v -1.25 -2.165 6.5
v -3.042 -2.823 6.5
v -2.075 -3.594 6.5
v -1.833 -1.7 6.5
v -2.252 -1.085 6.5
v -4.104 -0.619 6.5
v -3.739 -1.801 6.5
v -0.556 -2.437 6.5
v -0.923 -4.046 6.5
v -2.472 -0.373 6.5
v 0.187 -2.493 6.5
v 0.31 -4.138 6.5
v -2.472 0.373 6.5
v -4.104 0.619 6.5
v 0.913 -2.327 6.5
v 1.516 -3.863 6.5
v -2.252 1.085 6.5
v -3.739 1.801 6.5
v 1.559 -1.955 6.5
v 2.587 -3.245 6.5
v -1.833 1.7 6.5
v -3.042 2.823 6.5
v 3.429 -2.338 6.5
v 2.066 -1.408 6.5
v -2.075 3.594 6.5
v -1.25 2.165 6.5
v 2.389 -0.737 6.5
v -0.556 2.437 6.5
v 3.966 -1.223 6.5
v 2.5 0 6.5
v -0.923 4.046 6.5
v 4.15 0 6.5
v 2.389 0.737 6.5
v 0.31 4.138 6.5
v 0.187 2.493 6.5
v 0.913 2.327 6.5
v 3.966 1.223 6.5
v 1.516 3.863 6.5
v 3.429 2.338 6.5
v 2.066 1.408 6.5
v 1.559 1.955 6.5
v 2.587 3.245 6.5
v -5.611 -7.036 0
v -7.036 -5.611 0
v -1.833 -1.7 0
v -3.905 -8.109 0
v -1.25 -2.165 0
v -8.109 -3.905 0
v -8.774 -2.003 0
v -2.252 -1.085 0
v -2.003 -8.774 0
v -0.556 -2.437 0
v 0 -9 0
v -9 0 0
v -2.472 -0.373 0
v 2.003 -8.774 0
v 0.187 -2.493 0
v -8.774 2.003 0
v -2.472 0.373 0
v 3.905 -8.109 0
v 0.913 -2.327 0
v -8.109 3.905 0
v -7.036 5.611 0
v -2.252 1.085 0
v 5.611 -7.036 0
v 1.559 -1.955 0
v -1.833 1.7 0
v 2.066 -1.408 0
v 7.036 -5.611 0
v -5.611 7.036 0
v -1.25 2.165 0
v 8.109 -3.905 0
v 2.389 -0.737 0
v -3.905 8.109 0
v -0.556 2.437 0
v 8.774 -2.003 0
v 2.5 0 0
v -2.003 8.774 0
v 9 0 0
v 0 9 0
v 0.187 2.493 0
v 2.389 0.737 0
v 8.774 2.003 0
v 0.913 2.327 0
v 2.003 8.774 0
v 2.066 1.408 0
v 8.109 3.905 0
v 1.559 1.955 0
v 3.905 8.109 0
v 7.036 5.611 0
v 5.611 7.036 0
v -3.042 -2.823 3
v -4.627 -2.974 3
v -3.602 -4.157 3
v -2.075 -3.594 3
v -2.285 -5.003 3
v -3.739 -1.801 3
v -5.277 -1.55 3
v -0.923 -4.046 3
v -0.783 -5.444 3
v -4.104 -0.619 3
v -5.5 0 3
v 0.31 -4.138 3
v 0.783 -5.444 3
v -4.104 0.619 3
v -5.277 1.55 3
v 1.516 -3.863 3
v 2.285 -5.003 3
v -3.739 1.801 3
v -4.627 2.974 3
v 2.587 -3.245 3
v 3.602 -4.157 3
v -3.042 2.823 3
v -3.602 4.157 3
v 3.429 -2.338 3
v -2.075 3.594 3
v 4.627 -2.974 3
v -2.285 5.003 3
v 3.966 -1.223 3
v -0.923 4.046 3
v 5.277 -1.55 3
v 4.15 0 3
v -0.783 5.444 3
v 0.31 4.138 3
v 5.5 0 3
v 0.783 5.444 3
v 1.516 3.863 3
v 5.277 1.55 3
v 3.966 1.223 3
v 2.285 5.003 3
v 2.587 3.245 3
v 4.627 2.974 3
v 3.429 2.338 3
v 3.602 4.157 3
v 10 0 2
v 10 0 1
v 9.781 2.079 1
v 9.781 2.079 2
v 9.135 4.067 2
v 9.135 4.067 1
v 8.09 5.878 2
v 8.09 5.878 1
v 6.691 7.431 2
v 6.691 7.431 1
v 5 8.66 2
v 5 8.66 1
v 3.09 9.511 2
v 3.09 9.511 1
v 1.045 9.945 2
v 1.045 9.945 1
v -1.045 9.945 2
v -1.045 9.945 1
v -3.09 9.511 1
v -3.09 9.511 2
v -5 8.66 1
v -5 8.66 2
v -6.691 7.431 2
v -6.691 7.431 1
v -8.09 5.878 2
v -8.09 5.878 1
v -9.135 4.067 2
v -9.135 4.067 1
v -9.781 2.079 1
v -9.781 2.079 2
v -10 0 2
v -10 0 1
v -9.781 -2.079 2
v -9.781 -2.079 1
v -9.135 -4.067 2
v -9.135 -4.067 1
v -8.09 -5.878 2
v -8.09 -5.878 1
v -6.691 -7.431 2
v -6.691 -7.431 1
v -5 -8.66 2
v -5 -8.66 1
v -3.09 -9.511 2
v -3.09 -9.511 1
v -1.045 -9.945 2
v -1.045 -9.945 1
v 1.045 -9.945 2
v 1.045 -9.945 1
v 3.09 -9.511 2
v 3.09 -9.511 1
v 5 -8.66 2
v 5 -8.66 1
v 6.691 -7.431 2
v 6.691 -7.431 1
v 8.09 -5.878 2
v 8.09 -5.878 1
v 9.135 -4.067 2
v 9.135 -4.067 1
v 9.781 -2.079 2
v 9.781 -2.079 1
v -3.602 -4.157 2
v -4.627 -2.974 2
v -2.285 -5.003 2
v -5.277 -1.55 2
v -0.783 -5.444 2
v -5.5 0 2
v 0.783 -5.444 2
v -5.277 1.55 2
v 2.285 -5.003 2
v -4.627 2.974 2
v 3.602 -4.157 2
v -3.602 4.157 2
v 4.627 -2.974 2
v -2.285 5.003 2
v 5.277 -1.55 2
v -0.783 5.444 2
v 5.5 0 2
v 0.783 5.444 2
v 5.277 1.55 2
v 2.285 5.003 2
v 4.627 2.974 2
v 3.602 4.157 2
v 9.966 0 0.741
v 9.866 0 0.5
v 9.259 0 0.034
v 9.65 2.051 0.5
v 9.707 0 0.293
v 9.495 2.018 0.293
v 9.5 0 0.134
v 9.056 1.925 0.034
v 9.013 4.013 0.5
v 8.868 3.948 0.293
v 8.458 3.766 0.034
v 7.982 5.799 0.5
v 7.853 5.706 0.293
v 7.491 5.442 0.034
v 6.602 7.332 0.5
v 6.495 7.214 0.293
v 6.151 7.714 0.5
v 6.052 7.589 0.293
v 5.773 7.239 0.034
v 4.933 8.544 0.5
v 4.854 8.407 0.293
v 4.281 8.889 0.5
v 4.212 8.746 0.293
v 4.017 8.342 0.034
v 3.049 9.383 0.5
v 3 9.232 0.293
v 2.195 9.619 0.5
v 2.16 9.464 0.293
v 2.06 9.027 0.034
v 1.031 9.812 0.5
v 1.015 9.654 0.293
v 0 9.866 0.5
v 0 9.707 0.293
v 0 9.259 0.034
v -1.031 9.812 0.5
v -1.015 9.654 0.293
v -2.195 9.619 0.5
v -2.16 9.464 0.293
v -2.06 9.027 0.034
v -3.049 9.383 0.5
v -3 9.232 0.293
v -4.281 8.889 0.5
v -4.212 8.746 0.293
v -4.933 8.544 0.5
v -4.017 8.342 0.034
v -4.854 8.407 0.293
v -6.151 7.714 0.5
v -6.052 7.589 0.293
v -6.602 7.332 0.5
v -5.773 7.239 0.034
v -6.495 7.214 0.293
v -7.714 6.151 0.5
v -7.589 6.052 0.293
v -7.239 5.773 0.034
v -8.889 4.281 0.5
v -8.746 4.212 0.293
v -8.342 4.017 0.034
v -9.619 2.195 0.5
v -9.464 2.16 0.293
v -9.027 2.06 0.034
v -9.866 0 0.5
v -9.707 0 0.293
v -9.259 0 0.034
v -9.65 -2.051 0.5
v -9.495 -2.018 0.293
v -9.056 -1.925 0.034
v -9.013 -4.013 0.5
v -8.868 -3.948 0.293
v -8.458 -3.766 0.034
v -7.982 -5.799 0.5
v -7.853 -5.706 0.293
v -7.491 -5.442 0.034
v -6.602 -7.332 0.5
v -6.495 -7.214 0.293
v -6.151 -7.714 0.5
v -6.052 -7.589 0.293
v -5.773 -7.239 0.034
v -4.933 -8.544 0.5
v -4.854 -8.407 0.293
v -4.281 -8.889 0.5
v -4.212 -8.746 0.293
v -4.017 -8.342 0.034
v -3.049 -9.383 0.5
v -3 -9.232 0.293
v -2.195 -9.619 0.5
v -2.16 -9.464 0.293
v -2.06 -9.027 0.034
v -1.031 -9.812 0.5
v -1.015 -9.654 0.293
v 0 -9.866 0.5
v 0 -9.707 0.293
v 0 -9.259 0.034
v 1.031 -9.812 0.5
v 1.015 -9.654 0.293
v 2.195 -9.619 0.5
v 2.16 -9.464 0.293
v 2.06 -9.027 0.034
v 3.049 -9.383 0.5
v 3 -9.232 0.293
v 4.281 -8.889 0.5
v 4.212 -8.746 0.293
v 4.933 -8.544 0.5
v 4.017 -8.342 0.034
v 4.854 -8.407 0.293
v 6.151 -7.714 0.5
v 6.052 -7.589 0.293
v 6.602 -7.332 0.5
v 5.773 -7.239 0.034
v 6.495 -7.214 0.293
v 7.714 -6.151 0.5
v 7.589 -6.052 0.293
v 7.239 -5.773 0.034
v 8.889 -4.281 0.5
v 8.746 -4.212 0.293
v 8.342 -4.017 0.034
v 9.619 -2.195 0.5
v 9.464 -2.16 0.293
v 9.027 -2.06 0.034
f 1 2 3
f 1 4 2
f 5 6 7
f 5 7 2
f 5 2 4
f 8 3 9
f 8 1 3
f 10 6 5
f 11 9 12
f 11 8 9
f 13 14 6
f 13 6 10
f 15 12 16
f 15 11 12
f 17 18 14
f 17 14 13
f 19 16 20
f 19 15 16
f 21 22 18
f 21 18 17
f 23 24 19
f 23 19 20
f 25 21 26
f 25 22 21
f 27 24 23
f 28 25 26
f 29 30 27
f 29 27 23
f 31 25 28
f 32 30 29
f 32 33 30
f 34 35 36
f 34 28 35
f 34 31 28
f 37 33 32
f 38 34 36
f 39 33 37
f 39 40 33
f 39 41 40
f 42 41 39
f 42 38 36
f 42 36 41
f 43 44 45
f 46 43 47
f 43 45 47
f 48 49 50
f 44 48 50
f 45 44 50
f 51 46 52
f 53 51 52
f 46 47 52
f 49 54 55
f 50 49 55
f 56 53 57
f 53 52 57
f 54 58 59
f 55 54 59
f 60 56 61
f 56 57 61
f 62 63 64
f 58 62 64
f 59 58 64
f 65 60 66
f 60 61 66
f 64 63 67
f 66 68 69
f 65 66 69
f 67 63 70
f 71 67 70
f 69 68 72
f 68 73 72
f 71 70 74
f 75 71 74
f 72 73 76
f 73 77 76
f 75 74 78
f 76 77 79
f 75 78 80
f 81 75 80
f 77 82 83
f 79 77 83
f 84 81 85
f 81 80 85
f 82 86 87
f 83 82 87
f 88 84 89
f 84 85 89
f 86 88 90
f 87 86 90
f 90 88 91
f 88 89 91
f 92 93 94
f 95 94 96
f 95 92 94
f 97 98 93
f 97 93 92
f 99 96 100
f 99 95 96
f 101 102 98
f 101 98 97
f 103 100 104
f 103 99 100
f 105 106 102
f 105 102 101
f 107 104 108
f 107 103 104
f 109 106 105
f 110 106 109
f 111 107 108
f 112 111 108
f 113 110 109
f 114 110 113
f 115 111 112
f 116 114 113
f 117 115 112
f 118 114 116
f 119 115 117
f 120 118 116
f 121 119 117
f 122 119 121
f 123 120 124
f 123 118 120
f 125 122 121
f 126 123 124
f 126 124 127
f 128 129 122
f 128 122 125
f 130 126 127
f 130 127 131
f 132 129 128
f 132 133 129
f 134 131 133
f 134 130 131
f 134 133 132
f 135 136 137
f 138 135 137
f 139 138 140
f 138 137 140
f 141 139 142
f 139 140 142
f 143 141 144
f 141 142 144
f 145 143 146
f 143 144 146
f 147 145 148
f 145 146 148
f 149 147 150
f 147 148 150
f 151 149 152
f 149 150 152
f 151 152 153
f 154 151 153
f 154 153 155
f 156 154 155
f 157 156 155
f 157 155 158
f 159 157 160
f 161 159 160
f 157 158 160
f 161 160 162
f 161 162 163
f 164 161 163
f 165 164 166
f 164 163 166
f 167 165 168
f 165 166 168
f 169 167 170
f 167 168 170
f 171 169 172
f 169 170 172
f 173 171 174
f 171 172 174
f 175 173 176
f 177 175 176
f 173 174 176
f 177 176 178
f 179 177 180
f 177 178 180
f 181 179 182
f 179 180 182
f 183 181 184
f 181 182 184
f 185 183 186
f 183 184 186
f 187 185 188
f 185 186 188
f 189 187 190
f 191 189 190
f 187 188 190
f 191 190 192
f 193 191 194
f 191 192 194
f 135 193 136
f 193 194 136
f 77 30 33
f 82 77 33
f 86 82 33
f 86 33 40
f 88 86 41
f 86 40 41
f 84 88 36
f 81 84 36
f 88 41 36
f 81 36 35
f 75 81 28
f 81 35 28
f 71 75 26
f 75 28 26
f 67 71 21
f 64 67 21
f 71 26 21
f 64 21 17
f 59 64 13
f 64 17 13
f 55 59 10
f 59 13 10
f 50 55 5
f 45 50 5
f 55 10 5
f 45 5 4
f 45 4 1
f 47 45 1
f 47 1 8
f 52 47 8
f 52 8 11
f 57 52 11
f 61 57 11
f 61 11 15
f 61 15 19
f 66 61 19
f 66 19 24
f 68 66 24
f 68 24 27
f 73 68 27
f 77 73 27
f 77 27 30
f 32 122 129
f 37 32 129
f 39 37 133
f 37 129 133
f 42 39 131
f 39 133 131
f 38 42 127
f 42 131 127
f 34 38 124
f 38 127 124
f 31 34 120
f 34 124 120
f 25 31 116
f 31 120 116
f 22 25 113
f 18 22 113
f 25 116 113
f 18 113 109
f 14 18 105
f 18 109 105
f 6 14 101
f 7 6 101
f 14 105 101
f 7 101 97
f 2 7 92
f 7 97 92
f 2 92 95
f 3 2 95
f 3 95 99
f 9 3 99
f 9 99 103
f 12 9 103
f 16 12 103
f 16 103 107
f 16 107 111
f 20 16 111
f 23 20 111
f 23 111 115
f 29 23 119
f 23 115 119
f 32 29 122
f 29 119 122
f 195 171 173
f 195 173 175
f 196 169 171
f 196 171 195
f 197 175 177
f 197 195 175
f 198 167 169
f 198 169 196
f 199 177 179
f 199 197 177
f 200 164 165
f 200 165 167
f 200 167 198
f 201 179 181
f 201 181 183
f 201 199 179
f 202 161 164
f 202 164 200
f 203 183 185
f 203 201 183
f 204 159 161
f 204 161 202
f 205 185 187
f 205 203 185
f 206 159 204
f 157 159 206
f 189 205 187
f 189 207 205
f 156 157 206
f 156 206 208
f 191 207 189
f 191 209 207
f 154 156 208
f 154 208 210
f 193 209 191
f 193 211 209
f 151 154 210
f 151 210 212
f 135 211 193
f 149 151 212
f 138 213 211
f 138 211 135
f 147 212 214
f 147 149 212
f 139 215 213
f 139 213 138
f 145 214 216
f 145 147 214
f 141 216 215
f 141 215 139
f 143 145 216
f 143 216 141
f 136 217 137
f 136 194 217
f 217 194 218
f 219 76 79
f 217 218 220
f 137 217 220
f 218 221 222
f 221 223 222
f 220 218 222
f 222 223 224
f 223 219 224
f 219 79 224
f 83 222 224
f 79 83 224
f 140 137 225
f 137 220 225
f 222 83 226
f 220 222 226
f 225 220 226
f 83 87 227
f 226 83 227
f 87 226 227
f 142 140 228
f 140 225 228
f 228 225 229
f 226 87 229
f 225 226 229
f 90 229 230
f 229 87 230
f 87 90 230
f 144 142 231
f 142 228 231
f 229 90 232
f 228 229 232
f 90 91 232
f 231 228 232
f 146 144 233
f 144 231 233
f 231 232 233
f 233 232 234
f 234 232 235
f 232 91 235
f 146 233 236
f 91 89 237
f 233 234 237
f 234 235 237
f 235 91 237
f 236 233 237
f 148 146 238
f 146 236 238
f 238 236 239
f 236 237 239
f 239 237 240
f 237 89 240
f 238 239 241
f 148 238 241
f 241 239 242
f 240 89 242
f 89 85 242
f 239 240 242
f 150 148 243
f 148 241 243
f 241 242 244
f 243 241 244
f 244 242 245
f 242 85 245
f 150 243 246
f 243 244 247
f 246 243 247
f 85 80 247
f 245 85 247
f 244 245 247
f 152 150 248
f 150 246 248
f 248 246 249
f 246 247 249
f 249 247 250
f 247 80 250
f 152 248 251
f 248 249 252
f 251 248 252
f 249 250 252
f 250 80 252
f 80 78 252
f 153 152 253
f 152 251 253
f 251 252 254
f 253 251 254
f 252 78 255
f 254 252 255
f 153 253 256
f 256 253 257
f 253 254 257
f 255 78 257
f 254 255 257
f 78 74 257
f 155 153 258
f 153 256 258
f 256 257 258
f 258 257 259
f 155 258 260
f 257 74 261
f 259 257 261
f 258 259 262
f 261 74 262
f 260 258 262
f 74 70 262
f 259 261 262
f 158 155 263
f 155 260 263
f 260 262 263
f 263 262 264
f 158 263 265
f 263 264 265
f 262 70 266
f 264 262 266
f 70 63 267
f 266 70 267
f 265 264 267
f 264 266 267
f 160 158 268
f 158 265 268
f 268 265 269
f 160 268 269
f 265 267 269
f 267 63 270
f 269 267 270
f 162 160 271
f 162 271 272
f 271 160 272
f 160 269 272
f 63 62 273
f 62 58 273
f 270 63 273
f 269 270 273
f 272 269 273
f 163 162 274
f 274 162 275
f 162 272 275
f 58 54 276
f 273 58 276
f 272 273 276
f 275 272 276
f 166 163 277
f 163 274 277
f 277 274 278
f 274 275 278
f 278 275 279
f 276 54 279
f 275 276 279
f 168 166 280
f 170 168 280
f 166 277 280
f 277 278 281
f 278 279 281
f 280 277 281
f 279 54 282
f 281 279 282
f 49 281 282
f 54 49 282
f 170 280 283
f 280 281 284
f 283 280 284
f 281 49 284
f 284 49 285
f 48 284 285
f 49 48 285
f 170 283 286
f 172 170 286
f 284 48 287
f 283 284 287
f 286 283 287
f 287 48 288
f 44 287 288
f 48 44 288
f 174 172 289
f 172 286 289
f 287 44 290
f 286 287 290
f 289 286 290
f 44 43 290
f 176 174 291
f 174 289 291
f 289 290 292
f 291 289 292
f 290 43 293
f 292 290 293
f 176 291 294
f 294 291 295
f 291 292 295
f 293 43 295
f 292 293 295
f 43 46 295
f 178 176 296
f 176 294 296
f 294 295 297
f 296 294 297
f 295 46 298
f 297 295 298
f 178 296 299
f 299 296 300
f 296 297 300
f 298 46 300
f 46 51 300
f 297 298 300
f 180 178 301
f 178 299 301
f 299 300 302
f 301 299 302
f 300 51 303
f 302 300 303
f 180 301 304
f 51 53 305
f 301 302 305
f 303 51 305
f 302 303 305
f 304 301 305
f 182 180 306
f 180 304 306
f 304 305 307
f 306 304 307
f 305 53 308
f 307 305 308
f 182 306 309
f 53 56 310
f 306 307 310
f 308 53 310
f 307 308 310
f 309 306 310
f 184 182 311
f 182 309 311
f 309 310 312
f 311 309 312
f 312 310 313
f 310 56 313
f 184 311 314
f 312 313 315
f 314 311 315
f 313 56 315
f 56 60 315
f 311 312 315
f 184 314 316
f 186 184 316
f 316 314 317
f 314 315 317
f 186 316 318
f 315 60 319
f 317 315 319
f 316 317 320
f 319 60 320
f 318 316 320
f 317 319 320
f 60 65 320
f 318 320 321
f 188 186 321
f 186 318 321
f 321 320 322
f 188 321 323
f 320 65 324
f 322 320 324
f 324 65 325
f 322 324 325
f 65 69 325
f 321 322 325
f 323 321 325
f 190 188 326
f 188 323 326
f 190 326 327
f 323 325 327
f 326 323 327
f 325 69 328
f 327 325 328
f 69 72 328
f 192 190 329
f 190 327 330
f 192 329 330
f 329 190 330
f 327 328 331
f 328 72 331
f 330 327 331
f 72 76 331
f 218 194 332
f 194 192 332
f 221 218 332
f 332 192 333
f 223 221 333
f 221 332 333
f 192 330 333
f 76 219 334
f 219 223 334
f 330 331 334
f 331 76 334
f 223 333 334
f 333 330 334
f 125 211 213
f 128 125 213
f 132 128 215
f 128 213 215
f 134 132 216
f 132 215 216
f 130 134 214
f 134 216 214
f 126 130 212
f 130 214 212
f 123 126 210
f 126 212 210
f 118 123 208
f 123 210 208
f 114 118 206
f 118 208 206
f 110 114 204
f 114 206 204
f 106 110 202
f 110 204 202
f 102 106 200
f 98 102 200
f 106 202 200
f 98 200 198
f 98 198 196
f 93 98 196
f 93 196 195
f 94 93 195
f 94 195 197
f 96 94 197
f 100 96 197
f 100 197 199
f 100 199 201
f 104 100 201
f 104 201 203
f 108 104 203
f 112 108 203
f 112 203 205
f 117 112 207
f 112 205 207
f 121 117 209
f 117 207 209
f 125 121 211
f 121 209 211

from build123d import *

# Parameters (mm, degrees)
F0_R     = 10
F1_DEPTH = 2
F2_R     = 5.5
F3_DEPTH = 1
F4_R     = 4.15
F5_DEPTH = 3.5
F6_R     = 2.5
F7_DEPTH = 10
F8_R     = 1


with BuildPart() as f1:
    # F0 (on Top) → F1 (new body)
    with BuildSketch(Plane.XY):
        Circle(F0_R)
    extrude(amount=F1_DEPTH)

    # F2 (on face) → F3 (join)
    with BuildSketch(Plane.XY.offset(2)):
        Circle(F2_R)
    extrude(amount=F3_DEPTH)

    # F4 (on face) → F5 (join)
    with BuildSketch(Plane.XY.offset(3)):
        Circle(F4_R)
    extrude(amount=F5_DEPTH)

    # F6 (on face) → F7 (cut)
    with BuildSketch(Plane.XY.offset(6.5)):
        Circle(F6_R)
    extrude(amount=-F7_DEPTH, mode=Mode.SUBTRACT)

    # F8
    f8_edges = [f1.edges().sort_by_distance(p)[0] for p in [
        (-10, 0, 0),
    ]]
    fillet(f8_edges, radius=F8_R)


solid = f1.part
